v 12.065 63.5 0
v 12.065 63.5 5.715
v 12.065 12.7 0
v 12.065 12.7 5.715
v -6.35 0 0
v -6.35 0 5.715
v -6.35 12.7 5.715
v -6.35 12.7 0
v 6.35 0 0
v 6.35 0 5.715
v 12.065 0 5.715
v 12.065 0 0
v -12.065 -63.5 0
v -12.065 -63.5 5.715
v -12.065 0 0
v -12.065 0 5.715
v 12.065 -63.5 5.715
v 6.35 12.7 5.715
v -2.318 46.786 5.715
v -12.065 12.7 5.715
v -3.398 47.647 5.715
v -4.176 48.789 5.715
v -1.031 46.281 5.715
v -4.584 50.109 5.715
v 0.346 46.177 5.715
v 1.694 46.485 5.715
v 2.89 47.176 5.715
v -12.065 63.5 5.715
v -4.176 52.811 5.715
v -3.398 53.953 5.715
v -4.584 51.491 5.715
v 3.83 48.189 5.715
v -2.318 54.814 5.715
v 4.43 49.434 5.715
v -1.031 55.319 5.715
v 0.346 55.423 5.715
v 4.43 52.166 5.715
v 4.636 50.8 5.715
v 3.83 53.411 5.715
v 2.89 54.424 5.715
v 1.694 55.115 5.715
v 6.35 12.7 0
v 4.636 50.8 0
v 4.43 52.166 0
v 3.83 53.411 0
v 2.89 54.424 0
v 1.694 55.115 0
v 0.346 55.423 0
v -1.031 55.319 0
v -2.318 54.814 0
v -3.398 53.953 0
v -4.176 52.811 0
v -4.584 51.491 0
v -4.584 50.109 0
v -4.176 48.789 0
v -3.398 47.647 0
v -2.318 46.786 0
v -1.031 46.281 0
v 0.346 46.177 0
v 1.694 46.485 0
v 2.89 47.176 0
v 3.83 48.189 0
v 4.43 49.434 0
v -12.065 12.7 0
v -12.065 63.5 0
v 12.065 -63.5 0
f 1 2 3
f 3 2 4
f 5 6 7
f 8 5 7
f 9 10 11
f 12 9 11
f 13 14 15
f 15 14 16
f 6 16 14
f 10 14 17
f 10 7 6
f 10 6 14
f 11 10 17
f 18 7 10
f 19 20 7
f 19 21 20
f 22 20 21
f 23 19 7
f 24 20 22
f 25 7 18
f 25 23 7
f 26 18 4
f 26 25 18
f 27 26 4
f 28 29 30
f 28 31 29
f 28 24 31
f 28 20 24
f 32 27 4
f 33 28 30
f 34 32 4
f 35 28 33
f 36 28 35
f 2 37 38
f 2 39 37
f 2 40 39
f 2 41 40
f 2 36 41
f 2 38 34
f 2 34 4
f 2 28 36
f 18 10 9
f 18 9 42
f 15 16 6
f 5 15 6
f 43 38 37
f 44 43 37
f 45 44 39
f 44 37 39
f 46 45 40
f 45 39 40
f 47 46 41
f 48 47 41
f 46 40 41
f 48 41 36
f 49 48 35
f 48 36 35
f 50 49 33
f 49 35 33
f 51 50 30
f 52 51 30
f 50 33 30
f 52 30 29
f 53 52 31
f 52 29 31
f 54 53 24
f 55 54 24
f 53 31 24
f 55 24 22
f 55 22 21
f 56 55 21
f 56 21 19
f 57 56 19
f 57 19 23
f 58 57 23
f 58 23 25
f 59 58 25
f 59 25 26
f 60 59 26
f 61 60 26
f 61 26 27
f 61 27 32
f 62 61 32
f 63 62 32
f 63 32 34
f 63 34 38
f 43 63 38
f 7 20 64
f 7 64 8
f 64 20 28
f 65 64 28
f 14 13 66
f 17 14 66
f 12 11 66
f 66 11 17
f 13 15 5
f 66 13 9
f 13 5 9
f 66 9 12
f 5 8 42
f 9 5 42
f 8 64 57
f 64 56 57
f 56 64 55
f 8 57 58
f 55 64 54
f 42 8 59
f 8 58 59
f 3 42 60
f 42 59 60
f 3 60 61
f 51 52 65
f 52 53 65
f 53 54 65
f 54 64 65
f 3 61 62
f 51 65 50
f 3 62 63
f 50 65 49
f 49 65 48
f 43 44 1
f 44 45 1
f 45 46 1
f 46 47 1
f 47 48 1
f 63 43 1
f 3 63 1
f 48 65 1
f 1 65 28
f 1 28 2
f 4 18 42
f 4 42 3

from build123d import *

# Parameters (mm, degrees)
SKETCH1_W           = 50.8
SKETCH1_H           = 127
BOSS_EXTRUDE1_DEPTH = 5.715
SKETCH2_R           = 4.6355
SKETCH2_W           = 5.715
SKETCH2_H           = 12.7
CUT_EXTRUDE1_DEPTH  = 6.715
CUT_EXTRUDE2_DEPTH  = 6.715


with BuildPart() as part:
    # Sketch1 → Boss-Extrude1 (new body)
    with BuildSketch(Plane.XY):
        Rectangle(SKETCH1_W, SKETCH1_H)
    extrude(amount=BOSS_EXTRUDE1_DEPTH)

    # Sketch2 → Cut-Extrude1 (cut, through all)
    with BuildSketch(Plane.XY.offset(5.715)):
        with Locations((0, 50.8)):
            Circle(SKETCH2_R)
        with Locations((-9.2075, 6.35)):
            Rectangle(SKETCH2_W, SKETCH2_H)
        with Locations((9.2075, 6.35)):
            Rectangle(SKETCH2_W, SKETCH2_H)
    extrude(amount=-CUT_EXTRUDE1_DEPTH, mode=Mode.SUBTRACT)

    # Sketch3 → Cut-Extrude2 (cut, through all)
    with BuildSketch(Plane.XY.offset(5.715)):
        Polygon((-12.065, 12.7), (-12.065, 63.5), (-25.4, 63.5), (-25.4, -63.5), (-12.065, -63.5), (-12.065, 0), align=None)
        Polygon((25.4, 63.5), (12.065, 63.5), (12.065, 12.7), (12.065, 0), (12.065, -63.5), (25.4, -63.5), align=None)
    extrude(amount=-CUT_EXTRUDE2_DEPTH, mode=Mode.SUBTRACT)


solid = part.part
